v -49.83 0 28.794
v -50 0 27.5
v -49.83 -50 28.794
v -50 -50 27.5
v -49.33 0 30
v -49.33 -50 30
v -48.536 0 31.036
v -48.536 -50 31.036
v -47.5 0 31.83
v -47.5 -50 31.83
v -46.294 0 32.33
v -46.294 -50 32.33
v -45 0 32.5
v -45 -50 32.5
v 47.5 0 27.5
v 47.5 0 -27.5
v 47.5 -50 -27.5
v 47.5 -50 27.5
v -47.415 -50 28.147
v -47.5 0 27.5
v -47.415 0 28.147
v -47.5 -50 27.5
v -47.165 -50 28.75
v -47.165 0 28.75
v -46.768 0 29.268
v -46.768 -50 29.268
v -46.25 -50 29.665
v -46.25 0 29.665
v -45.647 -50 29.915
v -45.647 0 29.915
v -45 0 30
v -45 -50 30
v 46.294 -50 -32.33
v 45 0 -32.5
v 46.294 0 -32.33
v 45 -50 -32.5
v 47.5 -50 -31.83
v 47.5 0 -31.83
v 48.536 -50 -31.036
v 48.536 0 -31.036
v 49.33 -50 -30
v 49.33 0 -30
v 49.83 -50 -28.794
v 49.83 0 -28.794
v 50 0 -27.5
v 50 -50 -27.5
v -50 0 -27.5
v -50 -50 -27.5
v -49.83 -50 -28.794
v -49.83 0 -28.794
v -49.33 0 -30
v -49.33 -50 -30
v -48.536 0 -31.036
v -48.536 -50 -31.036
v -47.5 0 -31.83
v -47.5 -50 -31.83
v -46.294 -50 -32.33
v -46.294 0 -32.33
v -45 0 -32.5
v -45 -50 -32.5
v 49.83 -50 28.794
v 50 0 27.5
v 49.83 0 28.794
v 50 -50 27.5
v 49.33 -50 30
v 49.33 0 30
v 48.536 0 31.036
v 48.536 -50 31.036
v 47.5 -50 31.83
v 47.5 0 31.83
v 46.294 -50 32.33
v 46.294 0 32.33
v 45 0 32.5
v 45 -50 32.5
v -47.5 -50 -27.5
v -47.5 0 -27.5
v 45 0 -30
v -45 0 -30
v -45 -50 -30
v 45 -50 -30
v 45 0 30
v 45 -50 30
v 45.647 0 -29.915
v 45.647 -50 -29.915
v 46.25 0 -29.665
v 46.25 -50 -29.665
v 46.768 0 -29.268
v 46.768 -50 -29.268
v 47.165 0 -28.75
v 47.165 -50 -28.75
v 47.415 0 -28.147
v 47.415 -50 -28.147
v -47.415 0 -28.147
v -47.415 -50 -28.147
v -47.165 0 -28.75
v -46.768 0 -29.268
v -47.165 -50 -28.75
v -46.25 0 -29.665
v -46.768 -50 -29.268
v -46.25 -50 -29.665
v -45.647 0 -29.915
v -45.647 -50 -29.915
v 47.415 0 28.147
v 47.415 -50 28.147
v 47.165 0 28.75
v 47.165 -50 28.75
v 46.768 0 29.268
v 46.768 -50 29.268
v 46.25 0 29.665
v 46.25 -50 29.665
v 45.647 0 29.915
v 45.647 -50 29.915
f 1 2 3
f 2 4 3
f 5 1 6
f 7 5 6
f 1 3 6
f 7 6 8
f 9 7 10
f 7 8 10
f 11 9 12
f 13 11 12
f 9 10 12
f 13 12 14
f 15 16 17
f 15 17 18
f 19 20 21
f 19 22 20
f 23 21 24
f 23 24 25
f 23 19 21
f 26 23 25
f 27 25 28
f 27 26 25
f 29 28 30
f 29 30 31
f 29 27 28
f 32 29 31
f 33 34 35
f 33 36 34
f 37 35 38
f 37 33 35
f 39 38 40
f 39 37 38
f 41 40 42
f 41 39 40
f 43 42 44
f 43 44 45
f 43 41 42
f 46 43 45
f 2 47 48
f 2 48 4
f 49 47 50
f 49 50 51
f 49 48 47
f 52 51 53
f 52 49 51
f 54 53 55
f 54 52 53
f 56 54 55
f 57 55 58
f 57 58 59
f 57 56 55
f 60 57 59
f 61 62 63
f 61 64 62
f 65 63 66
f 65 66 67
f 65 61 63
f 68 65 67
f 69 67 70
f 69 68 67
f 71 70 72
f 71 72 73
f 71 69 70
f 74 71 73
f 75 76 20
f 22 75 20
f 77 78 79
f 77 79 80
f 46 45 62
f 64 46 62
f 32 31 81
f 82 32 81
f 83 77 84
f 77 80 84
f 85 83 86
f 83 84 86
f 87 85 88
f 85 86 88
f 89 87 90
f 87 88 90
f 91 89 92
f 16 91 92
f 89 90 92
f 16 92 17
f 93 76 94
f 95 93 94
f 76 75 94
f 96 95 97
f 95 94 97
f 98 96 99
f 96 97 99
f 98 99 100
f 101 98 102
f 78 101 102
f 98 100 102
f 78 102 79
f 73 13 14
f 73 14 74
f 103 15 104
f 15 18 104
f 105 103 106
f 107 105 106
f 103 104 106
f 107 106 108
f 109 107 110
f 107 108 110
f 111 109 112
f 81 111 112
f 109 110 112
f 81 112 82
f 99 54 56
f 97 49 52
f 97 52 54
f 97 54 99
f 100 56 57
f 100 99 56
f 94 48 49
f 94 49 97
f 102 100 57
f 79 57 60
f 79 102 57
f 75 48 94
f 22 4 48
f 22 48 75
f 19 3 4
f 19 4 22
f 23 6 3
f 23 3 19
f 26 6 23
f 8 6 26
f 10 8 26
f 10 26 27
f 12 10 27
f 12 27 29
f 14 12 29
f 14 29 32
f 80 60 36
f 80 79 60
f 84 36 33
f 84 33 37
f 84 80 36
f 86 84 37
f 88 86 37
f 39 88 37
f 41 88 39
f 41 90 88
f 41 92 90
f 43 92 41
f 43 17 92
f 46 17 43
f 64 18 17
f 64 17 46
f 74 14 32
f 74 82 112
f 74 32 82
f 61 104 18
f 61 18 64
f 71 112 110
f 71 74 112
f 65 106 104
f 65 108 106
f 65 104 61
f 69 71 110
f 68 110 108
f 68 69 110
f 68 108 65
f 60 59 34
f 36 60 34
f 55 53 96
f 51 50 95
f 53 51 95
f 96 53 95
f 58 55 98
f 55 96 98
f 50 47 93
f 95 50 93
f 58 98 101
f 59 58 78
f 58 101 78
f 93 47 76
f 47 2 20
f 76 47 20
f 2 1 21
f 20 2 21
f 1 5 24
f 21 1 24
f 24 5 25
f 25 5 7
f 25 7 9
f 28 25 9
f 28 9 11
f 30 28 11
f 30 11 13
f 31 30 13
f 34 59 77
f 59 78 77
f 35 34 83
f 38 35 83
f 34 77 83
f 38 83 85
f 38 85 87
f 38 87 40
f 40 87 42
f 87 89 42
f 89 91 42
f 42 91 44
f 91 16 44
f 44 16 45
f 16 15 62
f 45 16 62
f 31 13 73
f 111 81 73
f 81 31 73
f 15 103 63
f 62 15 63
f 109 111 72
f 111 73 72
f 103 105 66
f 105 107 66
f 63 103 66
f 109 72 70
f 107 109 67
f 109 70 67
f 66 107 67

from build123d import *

# Parameters (mm, degrees)
F0_W     = 100
F0_H     = 65
F1_DEPTH = 50
F2_R     = 5
F3_T     = -2.5


with BuildPart() as f1:
    # F0 (on Front) → F1 (new body)
    with BuildSketch(Plane.XZ):
        Rectangle(F0_W, F0_H)
    extrude(amount=F1_DEPTH)

    # F2
    f2_edges = [f1.edges().sort_by_distance(p)[0] for p in [
        (-50, -25, 32.5),
        (-50, -25, -32.5),
        (50, -25, 32.5),
        (50, -25, -32.5),
    ]]
    fillet(f2_edges, radius=F2_R)

    # F3
    f3_openings = [f1.faces().sort_by_distance(p)[0] for p in [
        (0, -50, 0),
        (0, 0, 0),
    ]]
    offset(amount=F3_T, openings=f3_openings)


solid = f1.part
